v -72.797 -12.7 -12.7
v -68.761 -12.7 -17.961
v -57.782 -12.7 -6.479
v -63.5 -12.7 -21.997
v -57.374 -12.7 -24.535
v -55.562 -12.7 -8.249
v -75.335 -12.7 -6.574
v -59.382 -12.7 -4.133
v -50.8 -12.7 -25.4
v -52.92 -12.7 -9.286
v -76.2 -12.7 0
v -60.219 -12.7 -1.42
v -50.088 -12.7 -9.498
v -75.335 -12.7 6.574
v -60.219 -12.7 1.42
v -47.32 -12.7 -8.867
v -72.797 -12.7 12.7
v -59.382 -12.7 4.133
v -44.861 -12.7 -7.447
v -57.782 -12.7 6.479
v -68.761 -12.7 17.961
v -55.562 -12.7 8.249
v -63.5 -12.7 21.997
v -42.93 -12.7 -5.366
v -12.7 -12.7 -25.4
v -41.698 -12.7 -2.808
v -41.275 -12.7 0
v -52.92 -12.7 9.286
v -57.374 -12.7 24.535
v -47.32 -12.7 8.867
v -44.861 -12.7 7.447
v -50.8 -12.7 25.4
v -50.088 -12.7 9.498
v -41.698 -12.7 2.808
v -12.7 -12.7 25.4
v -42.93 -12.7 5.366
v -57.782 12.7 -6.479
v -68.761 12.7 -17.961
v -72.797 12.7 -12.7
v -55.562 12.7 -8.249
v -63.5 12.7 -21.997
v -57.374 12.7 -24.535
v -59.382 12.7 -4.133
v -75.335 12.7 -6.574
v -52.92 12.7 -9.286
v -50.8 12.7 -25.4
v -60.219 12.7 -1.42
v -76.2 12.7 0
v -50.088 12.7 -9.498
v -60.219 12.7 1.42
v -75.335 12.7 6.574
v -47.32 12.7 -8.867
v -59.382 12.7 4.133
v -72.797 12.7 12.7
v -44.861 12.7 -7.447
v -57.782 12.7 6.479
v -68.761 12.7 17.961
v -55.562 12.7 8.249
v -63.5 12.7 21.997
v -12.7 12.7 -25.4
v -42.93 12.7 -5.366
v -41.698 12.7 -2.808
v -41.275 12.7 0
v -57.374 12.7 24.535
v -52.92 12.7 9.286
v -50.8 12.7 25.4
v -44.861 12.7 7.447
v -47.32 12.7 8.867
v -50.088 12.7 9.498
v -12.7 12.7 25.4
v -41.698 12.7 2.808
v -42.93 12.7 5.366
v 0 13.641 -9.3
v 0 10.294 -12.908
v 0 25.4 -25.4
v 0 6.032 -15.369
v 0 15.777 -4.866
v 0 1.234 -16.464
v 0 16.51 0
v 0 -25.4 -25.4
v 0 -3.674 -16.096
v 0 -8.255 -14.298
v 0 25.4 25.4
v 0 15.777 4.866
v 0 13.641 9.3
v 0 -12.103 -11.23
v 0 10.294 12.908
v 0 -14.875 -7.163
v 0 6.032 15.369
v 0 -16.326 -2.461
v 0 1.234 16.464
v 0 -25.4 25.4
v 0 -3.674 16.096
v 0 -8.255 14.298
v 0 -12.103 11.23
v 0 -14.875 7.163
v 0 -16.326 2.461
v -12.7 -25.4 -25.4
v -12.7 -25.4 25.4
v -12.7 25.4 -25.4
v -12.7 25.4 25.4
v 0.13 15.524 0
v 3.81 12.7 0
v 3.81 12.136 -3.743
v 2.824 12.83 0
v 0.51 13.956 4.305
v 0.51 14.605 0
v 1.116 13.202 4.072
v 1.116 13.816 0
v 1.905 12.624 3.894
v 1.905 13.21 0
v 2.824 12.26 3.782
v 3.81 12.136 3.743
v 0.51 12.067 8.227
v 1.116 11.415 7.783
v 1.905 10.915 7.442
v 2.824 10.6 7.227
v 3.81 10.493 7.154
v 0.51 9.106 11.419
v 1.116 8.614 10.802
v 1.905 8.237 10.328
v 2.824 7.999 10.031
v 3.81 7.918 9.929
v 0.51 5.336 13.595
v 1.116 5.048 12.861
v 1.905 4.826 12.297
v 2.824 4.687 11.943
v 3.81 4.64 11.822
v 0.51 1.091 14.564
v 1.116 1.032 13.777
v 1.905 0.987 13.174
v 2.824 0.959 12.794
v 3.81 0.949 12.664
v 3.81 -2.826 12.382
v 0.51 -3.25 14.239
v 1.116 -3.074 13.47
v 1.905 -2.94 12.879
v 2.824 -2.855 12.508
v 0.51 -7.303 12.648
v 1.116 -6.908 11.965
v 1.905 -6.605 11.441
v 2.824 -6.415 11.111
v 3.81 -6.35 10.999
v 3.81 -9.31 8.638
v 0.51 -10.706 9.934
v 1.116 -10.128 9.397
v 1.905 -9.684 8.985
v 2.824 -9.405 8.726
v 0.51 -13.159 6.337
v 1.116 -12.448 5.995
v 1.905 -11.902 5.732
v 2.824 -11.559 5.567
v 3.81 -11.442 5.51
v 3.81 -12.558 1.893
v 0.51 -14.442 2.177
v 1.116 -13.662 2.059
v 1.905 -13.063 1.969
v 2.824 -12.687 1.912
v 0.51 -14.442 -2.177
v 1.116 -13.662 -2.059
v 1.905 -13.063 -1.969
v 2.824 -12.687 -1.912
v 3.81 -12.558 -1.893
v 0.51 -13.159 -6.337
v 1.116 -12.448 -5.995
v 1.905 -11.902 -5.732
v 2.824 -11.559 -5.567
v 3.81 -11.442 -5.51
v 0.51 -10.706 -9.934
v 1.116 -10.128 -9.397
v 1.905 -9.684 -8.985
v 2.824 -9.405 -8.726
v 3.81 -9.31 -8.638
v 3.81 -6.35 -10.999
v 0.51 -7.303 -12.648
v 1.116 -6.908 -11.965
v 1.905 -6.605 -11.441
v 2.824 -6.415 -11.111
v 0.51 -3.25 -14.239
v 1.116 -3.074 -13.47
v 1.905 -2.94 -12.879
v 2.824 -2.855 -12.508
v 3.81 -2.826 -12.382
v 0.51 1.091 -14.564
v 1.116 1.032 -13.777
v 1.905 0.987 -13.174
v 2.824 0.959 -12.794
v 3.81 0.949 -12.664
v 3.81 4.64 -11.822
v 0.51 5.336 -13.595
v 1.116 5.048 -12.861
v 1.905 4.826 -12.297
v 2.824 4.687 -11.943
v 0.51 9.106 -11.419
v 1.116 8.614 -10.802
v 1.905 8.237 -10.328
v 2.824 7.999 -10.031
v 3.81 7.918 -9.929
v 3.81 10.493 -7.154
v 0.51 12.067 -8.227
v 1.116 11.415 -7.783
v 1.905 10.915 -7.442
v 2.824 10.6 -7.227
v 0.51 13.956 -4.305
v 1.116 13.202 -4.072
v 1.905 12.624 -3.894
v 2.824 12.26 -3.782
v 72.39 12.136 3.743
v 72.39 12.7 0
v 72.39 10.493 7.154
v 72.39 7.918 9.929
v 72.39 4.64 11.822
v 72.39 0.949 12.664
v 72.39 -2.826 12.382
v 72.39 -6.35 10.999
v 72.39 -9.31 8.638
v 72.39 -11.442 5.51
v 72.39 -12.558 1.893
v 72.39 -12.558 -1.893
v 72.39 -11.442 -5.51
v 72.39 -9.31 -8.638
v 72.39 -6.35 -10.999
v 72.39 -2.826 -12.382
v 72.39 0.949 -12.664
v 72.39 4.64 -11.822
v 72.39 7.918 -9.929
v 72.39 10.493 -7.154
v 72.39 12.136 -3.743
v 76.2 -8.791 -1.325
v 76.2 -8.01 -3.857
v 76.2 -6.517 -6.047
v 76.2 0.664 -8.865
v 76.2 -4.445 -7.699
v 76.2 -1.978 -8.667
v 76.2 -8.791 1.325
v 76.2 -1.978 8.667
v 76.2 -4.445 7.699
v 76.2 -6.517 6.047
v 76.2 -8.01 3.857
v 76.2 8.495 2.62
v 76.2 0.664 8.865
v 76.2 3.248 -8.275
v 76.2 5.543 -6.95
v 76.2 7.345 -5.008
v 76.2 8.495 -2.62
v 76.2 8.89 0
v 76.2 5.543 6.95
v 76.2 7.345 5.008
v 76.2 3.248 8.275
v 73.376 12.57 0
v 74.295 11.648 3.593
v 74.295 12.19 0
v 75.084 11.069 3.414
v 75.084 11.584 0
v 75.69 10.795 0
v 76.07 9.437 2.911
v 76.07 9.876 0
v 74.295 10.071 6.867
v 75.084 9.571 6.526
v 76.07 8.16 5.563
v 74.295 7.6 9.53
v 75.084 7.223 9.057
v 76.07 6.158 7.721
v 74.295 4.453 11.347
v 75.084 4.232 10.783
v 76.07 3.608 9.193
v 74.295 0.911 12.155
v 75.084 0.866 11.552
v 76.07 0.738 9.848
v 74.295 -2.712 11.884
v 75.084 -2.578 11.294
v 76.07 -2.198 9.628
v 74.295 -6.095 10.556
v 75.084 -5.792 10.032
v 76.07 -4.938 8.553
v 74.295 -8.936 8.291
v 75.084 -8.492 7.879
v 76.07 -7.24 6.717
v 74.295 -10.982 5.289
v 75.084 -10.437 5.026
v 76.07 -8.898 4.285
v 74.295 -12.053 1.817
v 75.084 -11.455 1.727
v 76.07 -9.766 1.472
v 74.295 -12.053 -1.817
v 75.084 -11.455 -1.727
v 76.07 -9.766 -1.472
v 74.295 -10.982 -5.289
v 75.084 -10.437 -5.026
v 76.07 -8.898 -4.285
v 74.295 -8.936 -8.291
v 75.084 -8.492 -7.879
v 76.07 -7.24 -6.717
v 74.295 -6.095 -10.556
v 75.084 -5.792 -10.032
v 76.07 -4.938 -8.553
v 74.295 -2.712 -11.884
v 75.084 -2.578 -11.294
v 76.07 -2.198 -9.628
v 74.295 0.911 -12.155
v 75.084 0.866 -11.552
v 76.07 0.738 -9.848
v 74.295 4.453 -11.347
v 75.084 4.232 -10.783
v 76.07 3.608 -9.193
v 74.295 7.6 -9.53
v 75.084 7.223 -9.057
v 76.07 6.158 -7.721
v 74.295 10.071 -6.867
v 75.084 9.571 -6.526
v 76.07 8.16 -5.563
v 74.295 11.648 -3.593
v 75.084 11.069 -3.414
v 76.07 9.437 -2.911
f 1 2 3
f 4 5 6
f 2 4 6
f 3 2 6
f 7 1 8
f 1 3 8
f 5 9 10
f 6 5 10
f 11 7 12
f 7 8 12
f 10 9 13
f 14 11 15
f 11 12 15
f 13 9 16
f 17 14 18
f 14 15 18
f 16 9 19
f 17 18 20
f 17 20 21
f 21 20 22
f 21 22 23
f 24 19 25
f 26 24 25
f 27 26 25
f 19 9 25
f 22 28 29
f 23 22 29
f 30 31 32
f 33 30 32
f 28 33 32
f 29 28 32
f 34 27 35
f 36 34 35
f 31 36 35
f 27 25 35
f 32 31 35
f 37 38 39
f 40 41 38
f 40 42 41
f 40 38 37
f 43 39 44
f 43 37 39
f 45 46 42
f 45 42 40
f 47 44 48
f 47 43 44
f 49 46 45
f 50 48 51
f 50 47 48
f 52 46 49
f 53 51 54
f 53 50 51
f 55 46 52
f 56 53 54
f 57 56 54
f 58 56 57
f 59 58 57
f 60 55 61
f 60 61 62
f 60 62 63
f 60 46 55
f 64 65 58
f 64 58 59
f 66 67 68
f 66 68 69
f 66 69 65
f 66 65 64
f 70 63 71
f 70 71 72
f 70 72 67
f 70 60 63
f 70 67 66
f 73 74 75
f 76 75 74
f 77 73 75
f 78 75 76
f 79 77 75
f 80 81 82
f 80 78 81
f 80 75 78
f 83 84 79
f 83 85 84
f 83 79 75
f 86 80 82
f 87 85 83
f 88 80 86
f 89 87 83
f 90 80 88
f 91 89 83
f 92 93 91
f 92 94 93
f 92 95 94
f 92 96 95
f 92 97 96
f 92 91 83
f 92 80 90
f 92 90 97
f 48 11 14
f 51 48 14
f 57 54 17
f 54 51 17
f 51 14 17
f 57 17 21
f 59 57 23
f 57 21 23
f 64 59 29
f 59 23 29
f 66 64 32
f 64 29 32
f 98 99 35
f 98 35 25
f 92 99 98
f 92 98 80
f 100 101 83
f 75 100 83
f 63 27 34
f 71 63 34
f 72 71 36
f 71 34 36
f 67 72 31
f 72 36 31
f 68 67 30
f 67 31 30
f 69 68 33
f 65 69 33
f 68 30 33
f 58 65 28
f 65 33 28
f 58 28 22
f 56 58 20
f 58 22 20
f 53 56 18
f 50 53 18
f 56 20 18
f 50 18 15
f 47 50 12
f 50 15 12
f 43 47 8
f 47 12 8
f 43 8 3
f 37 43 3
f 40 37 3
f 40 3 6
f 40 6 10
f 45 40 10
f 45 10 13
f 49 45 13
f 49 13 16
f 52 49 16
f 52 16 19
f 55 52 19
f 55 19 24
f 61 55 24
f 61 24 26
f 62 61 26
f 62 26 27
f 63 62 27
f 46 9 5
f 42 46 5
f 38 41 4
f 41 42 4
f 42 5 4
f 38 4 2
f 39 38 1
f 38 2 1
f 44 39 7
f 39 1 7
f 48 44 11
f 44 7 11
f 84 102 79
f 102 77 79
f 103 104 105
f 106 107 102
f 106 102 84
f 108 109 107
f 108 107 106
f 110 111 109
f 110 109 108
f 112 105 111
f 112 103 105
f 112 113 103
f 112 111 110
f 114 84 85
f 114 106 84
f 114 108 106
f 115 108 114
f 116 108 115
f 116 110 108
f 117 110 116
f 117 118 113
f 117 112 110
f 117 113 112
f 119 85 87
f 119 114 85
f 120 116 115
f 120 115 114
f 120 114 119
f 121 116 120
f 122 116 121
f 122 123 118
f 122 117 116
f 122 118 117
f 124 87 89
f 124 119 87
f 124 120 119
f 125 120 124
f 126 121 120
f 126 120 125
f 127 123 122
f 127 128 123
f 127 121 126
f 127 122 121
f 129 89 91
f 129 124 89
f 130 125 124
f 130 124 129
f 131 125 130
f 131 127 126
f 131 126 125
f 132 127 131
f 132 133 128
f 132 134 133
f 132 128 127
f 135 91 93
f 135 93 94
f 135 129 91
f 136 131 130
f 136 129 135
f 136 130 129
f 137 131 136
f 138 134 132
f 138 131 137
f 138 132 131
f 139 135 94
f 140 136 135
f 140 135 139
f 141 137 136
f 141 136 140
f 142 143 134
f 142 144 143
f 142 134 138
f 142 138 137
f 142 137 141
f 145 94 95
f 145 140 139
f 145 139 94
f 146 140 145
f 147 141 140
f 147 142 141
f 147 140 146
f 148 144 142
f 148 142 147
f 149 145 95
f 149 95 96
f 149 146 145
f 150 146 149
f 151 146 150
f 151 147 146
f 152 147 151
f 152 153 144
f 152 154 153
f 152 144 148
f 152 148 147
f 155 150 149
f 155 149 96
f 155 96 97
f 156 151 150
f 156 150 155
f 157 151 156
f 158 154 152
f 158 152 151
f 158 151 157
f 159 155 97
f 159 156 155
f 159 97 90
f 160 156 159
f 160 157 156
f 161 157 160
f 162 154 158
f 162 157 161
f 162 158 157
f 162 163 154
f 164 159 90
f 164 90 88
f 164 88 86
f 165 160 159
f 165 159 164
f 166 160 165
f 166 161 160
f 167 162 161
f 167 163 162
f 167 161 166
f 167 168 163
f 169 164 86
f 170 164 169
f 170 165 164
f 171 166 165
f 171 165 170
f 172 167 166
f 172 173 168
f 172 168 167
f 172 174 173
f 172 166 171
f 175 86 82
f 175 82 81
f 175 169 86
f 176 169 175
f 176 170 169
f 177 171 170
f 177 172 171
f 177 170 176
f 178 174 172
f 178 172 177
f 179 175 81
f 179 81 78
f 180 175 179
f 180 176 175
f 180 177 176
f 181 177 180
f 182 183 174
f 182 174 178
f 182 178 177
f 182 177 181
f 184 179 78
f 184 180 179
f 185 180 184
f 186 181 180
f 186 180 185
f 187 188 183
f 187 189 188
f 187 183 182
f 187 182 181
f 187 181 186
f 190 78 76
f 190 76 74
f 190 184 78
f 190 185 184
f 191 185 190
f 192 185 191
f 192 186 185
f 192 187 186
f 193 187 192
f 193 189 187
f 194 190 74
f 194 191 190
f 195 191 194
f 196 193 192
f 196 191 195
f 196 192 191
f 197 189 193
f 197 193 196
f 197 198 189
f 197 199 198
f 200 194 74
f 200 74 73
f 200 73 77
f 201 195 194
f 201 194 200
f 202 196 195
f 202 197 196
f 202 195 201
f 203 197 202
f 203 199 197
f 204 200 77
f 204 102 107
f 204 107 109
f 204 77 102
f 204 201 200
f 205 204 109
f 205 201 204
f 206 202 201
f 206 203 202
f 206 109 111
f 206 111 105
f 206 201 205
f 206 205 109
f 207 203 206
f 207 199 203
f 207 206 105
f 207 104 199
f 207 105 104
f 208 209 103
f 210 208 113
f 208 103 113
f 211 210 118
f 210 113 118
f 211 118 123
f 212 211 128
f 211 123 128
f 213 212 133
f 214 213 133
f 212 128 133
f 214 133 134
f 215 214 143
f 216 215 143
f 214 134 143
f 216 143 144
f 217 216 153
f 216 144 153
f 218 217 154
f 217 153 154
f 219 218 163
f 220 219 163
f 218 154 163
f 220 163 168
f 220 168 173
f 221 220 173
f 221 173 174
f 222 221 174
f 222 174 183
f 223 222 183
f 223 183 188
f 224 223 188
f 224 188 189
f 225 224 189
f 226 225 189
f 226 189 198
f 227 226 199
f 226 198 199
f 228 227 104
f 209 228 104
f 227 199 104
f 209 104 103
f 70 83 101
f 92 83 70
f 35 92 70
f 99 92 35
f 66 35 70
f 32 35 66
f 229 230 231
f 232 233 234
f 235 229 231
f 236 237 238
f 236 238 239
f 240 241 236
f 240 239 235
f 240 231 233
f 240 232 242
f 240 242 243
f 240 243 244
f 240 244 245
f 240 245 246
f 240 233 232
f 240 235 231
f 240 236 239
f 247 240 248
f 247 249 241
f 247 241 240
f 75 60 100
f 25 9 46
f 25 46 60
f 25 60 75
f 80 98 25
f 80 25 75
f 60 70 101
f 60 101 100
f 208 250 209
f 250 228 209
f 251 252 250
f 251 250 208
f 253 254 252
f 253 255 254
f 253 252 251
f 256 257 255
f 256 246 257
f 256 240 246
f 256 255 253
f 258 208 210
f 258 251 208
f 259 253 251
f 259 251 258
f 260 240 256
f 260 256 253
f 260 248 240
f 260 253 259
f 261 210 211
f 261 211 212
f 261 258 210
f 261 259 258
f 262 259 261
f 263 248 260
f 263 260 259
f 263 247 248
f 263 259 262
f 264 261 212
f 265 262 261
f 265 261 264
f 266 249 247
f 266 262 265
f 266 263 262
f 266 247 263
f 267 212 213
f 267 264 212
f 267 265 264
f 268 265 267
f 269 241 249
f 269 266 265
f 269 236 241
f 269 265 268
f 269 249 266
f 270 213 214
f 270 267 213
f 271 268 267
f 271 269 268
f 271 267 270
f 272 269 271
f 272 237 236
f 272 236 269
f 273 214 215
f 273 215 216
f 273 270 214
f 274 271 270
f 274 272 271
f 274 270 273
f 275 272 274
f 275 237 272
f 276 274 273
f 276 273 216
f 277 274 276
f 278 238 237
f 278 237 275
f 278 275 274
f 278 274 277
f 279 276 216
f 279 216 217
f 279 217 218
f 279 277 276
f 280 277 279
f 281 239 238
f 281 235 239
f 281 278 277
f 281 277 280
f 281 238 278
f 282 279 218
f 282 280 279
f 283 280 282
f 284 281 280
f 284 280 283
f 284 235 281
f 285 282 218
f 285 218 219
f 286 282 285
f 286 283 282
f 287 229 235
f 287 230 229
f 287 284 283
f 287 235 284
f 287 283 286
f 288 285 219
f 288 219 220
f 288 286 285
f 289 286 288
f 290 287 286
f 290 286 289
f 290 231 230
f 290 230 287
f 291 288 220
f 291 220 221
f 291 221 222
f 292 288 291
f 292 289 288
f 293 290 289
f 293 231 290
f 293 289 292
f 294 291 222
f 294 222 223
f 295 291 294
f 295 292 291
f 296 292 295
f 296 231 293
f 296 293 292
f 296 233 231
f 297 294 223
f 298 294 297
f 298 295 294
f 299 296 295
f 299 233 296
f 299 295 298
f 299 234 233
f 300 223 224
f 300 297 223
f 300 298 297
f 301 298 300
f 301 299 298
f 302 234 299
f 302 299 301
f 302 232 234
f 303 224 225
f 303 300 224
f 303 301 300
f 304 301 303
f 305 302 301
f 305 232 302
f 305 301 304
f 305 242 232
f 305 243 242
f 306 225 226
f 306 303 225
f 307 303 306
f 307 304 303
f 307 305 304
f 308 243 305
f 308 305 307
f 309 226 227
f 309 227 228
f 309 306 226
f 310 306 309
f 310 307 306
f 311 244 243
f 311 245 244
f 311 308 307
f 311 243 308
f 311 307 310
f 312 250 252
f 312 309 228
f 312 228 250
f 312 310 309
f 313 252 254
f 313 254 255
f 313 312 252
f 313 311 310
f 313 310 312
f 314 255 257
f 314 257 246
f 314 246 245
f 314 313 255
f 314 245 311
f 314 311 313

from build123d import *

# Parameters (mm, degrees)
F0_R     = 12.7
F1_DEPTH = 76.2
F3_DEPTH = 25.4
F4_W     = 25.4
F4_H     = 50.8
F5_DEPTH = 63.5
F7_DEPTH = 38.101
F6_R     = 9.525
F8_DEPTH = 38.101
F9_R     = 3.81


with BuildPart() as f1:
    # F0 (on Right) → F1 (new body)
    with BuildSketch(Plane.YZ):
        Circle(F0_R)
    extrude(amount=F1_DEPTH)

    # F2 (on Front) → F3 (join, symmetric)
    with BuildSketch(Plane.XZ):
        Polygon((0, -25.4), (0, 0), (0, 25.4), (-12.7, 25.4), (-12.7, -25.4), align=None)
    extrude(amount=F3_DEPTH, both=True)

    # F4 (on face) → F5 (join)
    with BuildSketch(Plane(origin=(-12.7, 0, 0), x_dir=(0, -1, 0), z_dir=(-1, 0, 0))):
        Rectangle(F4_W, F4_H)
    extrude(amount=F5_DEPTH)

    # F6 (on face) → F7 (cut, through all)
    with BuildSketch(Plane.XZ.offset(12.7)):
        with BuildLine():
            Line((-76.2, 25.4), (-76.2, 0))
            ThreePointArc((-76.2, 0), (-68.760512, 17.960512), (-50.8, 25.4))
            Line((-50.8, 25.4), (-76.2, 25.4))
        make_face()
        with BuildLine():
            ThreePointArc((-50.8, -25.4), (-68.760512, -17.960512), (-76.2, 0))
            Line((-76.2, 0), (-76.2, -25.4))
            Line((-76.2, -25.4), (-50.8, -25.4))
        make_face()
    extrude(amount=-F7_DEPTH, mode=Mode.SUBTRACT)

    # F6 (on face) → F8 (cut, through all)
    with BuildSketch(Plane.XZ.offset(12.7)):
        with Locations((-50.8, 0)):
            Circle(F6_R)
    extrude(amount=-F8_DEPTH, mode=Mode.SUBTRACT)

    # F9
    f9_edges = [f1.edges().sort_by_distance(p)[0] for p in [
        (76.2, -12.7, 0),
        (0, -12.7, 0),
    ]]
    fillet(f9_edges, radius=F9_R)


solid = f1.part
